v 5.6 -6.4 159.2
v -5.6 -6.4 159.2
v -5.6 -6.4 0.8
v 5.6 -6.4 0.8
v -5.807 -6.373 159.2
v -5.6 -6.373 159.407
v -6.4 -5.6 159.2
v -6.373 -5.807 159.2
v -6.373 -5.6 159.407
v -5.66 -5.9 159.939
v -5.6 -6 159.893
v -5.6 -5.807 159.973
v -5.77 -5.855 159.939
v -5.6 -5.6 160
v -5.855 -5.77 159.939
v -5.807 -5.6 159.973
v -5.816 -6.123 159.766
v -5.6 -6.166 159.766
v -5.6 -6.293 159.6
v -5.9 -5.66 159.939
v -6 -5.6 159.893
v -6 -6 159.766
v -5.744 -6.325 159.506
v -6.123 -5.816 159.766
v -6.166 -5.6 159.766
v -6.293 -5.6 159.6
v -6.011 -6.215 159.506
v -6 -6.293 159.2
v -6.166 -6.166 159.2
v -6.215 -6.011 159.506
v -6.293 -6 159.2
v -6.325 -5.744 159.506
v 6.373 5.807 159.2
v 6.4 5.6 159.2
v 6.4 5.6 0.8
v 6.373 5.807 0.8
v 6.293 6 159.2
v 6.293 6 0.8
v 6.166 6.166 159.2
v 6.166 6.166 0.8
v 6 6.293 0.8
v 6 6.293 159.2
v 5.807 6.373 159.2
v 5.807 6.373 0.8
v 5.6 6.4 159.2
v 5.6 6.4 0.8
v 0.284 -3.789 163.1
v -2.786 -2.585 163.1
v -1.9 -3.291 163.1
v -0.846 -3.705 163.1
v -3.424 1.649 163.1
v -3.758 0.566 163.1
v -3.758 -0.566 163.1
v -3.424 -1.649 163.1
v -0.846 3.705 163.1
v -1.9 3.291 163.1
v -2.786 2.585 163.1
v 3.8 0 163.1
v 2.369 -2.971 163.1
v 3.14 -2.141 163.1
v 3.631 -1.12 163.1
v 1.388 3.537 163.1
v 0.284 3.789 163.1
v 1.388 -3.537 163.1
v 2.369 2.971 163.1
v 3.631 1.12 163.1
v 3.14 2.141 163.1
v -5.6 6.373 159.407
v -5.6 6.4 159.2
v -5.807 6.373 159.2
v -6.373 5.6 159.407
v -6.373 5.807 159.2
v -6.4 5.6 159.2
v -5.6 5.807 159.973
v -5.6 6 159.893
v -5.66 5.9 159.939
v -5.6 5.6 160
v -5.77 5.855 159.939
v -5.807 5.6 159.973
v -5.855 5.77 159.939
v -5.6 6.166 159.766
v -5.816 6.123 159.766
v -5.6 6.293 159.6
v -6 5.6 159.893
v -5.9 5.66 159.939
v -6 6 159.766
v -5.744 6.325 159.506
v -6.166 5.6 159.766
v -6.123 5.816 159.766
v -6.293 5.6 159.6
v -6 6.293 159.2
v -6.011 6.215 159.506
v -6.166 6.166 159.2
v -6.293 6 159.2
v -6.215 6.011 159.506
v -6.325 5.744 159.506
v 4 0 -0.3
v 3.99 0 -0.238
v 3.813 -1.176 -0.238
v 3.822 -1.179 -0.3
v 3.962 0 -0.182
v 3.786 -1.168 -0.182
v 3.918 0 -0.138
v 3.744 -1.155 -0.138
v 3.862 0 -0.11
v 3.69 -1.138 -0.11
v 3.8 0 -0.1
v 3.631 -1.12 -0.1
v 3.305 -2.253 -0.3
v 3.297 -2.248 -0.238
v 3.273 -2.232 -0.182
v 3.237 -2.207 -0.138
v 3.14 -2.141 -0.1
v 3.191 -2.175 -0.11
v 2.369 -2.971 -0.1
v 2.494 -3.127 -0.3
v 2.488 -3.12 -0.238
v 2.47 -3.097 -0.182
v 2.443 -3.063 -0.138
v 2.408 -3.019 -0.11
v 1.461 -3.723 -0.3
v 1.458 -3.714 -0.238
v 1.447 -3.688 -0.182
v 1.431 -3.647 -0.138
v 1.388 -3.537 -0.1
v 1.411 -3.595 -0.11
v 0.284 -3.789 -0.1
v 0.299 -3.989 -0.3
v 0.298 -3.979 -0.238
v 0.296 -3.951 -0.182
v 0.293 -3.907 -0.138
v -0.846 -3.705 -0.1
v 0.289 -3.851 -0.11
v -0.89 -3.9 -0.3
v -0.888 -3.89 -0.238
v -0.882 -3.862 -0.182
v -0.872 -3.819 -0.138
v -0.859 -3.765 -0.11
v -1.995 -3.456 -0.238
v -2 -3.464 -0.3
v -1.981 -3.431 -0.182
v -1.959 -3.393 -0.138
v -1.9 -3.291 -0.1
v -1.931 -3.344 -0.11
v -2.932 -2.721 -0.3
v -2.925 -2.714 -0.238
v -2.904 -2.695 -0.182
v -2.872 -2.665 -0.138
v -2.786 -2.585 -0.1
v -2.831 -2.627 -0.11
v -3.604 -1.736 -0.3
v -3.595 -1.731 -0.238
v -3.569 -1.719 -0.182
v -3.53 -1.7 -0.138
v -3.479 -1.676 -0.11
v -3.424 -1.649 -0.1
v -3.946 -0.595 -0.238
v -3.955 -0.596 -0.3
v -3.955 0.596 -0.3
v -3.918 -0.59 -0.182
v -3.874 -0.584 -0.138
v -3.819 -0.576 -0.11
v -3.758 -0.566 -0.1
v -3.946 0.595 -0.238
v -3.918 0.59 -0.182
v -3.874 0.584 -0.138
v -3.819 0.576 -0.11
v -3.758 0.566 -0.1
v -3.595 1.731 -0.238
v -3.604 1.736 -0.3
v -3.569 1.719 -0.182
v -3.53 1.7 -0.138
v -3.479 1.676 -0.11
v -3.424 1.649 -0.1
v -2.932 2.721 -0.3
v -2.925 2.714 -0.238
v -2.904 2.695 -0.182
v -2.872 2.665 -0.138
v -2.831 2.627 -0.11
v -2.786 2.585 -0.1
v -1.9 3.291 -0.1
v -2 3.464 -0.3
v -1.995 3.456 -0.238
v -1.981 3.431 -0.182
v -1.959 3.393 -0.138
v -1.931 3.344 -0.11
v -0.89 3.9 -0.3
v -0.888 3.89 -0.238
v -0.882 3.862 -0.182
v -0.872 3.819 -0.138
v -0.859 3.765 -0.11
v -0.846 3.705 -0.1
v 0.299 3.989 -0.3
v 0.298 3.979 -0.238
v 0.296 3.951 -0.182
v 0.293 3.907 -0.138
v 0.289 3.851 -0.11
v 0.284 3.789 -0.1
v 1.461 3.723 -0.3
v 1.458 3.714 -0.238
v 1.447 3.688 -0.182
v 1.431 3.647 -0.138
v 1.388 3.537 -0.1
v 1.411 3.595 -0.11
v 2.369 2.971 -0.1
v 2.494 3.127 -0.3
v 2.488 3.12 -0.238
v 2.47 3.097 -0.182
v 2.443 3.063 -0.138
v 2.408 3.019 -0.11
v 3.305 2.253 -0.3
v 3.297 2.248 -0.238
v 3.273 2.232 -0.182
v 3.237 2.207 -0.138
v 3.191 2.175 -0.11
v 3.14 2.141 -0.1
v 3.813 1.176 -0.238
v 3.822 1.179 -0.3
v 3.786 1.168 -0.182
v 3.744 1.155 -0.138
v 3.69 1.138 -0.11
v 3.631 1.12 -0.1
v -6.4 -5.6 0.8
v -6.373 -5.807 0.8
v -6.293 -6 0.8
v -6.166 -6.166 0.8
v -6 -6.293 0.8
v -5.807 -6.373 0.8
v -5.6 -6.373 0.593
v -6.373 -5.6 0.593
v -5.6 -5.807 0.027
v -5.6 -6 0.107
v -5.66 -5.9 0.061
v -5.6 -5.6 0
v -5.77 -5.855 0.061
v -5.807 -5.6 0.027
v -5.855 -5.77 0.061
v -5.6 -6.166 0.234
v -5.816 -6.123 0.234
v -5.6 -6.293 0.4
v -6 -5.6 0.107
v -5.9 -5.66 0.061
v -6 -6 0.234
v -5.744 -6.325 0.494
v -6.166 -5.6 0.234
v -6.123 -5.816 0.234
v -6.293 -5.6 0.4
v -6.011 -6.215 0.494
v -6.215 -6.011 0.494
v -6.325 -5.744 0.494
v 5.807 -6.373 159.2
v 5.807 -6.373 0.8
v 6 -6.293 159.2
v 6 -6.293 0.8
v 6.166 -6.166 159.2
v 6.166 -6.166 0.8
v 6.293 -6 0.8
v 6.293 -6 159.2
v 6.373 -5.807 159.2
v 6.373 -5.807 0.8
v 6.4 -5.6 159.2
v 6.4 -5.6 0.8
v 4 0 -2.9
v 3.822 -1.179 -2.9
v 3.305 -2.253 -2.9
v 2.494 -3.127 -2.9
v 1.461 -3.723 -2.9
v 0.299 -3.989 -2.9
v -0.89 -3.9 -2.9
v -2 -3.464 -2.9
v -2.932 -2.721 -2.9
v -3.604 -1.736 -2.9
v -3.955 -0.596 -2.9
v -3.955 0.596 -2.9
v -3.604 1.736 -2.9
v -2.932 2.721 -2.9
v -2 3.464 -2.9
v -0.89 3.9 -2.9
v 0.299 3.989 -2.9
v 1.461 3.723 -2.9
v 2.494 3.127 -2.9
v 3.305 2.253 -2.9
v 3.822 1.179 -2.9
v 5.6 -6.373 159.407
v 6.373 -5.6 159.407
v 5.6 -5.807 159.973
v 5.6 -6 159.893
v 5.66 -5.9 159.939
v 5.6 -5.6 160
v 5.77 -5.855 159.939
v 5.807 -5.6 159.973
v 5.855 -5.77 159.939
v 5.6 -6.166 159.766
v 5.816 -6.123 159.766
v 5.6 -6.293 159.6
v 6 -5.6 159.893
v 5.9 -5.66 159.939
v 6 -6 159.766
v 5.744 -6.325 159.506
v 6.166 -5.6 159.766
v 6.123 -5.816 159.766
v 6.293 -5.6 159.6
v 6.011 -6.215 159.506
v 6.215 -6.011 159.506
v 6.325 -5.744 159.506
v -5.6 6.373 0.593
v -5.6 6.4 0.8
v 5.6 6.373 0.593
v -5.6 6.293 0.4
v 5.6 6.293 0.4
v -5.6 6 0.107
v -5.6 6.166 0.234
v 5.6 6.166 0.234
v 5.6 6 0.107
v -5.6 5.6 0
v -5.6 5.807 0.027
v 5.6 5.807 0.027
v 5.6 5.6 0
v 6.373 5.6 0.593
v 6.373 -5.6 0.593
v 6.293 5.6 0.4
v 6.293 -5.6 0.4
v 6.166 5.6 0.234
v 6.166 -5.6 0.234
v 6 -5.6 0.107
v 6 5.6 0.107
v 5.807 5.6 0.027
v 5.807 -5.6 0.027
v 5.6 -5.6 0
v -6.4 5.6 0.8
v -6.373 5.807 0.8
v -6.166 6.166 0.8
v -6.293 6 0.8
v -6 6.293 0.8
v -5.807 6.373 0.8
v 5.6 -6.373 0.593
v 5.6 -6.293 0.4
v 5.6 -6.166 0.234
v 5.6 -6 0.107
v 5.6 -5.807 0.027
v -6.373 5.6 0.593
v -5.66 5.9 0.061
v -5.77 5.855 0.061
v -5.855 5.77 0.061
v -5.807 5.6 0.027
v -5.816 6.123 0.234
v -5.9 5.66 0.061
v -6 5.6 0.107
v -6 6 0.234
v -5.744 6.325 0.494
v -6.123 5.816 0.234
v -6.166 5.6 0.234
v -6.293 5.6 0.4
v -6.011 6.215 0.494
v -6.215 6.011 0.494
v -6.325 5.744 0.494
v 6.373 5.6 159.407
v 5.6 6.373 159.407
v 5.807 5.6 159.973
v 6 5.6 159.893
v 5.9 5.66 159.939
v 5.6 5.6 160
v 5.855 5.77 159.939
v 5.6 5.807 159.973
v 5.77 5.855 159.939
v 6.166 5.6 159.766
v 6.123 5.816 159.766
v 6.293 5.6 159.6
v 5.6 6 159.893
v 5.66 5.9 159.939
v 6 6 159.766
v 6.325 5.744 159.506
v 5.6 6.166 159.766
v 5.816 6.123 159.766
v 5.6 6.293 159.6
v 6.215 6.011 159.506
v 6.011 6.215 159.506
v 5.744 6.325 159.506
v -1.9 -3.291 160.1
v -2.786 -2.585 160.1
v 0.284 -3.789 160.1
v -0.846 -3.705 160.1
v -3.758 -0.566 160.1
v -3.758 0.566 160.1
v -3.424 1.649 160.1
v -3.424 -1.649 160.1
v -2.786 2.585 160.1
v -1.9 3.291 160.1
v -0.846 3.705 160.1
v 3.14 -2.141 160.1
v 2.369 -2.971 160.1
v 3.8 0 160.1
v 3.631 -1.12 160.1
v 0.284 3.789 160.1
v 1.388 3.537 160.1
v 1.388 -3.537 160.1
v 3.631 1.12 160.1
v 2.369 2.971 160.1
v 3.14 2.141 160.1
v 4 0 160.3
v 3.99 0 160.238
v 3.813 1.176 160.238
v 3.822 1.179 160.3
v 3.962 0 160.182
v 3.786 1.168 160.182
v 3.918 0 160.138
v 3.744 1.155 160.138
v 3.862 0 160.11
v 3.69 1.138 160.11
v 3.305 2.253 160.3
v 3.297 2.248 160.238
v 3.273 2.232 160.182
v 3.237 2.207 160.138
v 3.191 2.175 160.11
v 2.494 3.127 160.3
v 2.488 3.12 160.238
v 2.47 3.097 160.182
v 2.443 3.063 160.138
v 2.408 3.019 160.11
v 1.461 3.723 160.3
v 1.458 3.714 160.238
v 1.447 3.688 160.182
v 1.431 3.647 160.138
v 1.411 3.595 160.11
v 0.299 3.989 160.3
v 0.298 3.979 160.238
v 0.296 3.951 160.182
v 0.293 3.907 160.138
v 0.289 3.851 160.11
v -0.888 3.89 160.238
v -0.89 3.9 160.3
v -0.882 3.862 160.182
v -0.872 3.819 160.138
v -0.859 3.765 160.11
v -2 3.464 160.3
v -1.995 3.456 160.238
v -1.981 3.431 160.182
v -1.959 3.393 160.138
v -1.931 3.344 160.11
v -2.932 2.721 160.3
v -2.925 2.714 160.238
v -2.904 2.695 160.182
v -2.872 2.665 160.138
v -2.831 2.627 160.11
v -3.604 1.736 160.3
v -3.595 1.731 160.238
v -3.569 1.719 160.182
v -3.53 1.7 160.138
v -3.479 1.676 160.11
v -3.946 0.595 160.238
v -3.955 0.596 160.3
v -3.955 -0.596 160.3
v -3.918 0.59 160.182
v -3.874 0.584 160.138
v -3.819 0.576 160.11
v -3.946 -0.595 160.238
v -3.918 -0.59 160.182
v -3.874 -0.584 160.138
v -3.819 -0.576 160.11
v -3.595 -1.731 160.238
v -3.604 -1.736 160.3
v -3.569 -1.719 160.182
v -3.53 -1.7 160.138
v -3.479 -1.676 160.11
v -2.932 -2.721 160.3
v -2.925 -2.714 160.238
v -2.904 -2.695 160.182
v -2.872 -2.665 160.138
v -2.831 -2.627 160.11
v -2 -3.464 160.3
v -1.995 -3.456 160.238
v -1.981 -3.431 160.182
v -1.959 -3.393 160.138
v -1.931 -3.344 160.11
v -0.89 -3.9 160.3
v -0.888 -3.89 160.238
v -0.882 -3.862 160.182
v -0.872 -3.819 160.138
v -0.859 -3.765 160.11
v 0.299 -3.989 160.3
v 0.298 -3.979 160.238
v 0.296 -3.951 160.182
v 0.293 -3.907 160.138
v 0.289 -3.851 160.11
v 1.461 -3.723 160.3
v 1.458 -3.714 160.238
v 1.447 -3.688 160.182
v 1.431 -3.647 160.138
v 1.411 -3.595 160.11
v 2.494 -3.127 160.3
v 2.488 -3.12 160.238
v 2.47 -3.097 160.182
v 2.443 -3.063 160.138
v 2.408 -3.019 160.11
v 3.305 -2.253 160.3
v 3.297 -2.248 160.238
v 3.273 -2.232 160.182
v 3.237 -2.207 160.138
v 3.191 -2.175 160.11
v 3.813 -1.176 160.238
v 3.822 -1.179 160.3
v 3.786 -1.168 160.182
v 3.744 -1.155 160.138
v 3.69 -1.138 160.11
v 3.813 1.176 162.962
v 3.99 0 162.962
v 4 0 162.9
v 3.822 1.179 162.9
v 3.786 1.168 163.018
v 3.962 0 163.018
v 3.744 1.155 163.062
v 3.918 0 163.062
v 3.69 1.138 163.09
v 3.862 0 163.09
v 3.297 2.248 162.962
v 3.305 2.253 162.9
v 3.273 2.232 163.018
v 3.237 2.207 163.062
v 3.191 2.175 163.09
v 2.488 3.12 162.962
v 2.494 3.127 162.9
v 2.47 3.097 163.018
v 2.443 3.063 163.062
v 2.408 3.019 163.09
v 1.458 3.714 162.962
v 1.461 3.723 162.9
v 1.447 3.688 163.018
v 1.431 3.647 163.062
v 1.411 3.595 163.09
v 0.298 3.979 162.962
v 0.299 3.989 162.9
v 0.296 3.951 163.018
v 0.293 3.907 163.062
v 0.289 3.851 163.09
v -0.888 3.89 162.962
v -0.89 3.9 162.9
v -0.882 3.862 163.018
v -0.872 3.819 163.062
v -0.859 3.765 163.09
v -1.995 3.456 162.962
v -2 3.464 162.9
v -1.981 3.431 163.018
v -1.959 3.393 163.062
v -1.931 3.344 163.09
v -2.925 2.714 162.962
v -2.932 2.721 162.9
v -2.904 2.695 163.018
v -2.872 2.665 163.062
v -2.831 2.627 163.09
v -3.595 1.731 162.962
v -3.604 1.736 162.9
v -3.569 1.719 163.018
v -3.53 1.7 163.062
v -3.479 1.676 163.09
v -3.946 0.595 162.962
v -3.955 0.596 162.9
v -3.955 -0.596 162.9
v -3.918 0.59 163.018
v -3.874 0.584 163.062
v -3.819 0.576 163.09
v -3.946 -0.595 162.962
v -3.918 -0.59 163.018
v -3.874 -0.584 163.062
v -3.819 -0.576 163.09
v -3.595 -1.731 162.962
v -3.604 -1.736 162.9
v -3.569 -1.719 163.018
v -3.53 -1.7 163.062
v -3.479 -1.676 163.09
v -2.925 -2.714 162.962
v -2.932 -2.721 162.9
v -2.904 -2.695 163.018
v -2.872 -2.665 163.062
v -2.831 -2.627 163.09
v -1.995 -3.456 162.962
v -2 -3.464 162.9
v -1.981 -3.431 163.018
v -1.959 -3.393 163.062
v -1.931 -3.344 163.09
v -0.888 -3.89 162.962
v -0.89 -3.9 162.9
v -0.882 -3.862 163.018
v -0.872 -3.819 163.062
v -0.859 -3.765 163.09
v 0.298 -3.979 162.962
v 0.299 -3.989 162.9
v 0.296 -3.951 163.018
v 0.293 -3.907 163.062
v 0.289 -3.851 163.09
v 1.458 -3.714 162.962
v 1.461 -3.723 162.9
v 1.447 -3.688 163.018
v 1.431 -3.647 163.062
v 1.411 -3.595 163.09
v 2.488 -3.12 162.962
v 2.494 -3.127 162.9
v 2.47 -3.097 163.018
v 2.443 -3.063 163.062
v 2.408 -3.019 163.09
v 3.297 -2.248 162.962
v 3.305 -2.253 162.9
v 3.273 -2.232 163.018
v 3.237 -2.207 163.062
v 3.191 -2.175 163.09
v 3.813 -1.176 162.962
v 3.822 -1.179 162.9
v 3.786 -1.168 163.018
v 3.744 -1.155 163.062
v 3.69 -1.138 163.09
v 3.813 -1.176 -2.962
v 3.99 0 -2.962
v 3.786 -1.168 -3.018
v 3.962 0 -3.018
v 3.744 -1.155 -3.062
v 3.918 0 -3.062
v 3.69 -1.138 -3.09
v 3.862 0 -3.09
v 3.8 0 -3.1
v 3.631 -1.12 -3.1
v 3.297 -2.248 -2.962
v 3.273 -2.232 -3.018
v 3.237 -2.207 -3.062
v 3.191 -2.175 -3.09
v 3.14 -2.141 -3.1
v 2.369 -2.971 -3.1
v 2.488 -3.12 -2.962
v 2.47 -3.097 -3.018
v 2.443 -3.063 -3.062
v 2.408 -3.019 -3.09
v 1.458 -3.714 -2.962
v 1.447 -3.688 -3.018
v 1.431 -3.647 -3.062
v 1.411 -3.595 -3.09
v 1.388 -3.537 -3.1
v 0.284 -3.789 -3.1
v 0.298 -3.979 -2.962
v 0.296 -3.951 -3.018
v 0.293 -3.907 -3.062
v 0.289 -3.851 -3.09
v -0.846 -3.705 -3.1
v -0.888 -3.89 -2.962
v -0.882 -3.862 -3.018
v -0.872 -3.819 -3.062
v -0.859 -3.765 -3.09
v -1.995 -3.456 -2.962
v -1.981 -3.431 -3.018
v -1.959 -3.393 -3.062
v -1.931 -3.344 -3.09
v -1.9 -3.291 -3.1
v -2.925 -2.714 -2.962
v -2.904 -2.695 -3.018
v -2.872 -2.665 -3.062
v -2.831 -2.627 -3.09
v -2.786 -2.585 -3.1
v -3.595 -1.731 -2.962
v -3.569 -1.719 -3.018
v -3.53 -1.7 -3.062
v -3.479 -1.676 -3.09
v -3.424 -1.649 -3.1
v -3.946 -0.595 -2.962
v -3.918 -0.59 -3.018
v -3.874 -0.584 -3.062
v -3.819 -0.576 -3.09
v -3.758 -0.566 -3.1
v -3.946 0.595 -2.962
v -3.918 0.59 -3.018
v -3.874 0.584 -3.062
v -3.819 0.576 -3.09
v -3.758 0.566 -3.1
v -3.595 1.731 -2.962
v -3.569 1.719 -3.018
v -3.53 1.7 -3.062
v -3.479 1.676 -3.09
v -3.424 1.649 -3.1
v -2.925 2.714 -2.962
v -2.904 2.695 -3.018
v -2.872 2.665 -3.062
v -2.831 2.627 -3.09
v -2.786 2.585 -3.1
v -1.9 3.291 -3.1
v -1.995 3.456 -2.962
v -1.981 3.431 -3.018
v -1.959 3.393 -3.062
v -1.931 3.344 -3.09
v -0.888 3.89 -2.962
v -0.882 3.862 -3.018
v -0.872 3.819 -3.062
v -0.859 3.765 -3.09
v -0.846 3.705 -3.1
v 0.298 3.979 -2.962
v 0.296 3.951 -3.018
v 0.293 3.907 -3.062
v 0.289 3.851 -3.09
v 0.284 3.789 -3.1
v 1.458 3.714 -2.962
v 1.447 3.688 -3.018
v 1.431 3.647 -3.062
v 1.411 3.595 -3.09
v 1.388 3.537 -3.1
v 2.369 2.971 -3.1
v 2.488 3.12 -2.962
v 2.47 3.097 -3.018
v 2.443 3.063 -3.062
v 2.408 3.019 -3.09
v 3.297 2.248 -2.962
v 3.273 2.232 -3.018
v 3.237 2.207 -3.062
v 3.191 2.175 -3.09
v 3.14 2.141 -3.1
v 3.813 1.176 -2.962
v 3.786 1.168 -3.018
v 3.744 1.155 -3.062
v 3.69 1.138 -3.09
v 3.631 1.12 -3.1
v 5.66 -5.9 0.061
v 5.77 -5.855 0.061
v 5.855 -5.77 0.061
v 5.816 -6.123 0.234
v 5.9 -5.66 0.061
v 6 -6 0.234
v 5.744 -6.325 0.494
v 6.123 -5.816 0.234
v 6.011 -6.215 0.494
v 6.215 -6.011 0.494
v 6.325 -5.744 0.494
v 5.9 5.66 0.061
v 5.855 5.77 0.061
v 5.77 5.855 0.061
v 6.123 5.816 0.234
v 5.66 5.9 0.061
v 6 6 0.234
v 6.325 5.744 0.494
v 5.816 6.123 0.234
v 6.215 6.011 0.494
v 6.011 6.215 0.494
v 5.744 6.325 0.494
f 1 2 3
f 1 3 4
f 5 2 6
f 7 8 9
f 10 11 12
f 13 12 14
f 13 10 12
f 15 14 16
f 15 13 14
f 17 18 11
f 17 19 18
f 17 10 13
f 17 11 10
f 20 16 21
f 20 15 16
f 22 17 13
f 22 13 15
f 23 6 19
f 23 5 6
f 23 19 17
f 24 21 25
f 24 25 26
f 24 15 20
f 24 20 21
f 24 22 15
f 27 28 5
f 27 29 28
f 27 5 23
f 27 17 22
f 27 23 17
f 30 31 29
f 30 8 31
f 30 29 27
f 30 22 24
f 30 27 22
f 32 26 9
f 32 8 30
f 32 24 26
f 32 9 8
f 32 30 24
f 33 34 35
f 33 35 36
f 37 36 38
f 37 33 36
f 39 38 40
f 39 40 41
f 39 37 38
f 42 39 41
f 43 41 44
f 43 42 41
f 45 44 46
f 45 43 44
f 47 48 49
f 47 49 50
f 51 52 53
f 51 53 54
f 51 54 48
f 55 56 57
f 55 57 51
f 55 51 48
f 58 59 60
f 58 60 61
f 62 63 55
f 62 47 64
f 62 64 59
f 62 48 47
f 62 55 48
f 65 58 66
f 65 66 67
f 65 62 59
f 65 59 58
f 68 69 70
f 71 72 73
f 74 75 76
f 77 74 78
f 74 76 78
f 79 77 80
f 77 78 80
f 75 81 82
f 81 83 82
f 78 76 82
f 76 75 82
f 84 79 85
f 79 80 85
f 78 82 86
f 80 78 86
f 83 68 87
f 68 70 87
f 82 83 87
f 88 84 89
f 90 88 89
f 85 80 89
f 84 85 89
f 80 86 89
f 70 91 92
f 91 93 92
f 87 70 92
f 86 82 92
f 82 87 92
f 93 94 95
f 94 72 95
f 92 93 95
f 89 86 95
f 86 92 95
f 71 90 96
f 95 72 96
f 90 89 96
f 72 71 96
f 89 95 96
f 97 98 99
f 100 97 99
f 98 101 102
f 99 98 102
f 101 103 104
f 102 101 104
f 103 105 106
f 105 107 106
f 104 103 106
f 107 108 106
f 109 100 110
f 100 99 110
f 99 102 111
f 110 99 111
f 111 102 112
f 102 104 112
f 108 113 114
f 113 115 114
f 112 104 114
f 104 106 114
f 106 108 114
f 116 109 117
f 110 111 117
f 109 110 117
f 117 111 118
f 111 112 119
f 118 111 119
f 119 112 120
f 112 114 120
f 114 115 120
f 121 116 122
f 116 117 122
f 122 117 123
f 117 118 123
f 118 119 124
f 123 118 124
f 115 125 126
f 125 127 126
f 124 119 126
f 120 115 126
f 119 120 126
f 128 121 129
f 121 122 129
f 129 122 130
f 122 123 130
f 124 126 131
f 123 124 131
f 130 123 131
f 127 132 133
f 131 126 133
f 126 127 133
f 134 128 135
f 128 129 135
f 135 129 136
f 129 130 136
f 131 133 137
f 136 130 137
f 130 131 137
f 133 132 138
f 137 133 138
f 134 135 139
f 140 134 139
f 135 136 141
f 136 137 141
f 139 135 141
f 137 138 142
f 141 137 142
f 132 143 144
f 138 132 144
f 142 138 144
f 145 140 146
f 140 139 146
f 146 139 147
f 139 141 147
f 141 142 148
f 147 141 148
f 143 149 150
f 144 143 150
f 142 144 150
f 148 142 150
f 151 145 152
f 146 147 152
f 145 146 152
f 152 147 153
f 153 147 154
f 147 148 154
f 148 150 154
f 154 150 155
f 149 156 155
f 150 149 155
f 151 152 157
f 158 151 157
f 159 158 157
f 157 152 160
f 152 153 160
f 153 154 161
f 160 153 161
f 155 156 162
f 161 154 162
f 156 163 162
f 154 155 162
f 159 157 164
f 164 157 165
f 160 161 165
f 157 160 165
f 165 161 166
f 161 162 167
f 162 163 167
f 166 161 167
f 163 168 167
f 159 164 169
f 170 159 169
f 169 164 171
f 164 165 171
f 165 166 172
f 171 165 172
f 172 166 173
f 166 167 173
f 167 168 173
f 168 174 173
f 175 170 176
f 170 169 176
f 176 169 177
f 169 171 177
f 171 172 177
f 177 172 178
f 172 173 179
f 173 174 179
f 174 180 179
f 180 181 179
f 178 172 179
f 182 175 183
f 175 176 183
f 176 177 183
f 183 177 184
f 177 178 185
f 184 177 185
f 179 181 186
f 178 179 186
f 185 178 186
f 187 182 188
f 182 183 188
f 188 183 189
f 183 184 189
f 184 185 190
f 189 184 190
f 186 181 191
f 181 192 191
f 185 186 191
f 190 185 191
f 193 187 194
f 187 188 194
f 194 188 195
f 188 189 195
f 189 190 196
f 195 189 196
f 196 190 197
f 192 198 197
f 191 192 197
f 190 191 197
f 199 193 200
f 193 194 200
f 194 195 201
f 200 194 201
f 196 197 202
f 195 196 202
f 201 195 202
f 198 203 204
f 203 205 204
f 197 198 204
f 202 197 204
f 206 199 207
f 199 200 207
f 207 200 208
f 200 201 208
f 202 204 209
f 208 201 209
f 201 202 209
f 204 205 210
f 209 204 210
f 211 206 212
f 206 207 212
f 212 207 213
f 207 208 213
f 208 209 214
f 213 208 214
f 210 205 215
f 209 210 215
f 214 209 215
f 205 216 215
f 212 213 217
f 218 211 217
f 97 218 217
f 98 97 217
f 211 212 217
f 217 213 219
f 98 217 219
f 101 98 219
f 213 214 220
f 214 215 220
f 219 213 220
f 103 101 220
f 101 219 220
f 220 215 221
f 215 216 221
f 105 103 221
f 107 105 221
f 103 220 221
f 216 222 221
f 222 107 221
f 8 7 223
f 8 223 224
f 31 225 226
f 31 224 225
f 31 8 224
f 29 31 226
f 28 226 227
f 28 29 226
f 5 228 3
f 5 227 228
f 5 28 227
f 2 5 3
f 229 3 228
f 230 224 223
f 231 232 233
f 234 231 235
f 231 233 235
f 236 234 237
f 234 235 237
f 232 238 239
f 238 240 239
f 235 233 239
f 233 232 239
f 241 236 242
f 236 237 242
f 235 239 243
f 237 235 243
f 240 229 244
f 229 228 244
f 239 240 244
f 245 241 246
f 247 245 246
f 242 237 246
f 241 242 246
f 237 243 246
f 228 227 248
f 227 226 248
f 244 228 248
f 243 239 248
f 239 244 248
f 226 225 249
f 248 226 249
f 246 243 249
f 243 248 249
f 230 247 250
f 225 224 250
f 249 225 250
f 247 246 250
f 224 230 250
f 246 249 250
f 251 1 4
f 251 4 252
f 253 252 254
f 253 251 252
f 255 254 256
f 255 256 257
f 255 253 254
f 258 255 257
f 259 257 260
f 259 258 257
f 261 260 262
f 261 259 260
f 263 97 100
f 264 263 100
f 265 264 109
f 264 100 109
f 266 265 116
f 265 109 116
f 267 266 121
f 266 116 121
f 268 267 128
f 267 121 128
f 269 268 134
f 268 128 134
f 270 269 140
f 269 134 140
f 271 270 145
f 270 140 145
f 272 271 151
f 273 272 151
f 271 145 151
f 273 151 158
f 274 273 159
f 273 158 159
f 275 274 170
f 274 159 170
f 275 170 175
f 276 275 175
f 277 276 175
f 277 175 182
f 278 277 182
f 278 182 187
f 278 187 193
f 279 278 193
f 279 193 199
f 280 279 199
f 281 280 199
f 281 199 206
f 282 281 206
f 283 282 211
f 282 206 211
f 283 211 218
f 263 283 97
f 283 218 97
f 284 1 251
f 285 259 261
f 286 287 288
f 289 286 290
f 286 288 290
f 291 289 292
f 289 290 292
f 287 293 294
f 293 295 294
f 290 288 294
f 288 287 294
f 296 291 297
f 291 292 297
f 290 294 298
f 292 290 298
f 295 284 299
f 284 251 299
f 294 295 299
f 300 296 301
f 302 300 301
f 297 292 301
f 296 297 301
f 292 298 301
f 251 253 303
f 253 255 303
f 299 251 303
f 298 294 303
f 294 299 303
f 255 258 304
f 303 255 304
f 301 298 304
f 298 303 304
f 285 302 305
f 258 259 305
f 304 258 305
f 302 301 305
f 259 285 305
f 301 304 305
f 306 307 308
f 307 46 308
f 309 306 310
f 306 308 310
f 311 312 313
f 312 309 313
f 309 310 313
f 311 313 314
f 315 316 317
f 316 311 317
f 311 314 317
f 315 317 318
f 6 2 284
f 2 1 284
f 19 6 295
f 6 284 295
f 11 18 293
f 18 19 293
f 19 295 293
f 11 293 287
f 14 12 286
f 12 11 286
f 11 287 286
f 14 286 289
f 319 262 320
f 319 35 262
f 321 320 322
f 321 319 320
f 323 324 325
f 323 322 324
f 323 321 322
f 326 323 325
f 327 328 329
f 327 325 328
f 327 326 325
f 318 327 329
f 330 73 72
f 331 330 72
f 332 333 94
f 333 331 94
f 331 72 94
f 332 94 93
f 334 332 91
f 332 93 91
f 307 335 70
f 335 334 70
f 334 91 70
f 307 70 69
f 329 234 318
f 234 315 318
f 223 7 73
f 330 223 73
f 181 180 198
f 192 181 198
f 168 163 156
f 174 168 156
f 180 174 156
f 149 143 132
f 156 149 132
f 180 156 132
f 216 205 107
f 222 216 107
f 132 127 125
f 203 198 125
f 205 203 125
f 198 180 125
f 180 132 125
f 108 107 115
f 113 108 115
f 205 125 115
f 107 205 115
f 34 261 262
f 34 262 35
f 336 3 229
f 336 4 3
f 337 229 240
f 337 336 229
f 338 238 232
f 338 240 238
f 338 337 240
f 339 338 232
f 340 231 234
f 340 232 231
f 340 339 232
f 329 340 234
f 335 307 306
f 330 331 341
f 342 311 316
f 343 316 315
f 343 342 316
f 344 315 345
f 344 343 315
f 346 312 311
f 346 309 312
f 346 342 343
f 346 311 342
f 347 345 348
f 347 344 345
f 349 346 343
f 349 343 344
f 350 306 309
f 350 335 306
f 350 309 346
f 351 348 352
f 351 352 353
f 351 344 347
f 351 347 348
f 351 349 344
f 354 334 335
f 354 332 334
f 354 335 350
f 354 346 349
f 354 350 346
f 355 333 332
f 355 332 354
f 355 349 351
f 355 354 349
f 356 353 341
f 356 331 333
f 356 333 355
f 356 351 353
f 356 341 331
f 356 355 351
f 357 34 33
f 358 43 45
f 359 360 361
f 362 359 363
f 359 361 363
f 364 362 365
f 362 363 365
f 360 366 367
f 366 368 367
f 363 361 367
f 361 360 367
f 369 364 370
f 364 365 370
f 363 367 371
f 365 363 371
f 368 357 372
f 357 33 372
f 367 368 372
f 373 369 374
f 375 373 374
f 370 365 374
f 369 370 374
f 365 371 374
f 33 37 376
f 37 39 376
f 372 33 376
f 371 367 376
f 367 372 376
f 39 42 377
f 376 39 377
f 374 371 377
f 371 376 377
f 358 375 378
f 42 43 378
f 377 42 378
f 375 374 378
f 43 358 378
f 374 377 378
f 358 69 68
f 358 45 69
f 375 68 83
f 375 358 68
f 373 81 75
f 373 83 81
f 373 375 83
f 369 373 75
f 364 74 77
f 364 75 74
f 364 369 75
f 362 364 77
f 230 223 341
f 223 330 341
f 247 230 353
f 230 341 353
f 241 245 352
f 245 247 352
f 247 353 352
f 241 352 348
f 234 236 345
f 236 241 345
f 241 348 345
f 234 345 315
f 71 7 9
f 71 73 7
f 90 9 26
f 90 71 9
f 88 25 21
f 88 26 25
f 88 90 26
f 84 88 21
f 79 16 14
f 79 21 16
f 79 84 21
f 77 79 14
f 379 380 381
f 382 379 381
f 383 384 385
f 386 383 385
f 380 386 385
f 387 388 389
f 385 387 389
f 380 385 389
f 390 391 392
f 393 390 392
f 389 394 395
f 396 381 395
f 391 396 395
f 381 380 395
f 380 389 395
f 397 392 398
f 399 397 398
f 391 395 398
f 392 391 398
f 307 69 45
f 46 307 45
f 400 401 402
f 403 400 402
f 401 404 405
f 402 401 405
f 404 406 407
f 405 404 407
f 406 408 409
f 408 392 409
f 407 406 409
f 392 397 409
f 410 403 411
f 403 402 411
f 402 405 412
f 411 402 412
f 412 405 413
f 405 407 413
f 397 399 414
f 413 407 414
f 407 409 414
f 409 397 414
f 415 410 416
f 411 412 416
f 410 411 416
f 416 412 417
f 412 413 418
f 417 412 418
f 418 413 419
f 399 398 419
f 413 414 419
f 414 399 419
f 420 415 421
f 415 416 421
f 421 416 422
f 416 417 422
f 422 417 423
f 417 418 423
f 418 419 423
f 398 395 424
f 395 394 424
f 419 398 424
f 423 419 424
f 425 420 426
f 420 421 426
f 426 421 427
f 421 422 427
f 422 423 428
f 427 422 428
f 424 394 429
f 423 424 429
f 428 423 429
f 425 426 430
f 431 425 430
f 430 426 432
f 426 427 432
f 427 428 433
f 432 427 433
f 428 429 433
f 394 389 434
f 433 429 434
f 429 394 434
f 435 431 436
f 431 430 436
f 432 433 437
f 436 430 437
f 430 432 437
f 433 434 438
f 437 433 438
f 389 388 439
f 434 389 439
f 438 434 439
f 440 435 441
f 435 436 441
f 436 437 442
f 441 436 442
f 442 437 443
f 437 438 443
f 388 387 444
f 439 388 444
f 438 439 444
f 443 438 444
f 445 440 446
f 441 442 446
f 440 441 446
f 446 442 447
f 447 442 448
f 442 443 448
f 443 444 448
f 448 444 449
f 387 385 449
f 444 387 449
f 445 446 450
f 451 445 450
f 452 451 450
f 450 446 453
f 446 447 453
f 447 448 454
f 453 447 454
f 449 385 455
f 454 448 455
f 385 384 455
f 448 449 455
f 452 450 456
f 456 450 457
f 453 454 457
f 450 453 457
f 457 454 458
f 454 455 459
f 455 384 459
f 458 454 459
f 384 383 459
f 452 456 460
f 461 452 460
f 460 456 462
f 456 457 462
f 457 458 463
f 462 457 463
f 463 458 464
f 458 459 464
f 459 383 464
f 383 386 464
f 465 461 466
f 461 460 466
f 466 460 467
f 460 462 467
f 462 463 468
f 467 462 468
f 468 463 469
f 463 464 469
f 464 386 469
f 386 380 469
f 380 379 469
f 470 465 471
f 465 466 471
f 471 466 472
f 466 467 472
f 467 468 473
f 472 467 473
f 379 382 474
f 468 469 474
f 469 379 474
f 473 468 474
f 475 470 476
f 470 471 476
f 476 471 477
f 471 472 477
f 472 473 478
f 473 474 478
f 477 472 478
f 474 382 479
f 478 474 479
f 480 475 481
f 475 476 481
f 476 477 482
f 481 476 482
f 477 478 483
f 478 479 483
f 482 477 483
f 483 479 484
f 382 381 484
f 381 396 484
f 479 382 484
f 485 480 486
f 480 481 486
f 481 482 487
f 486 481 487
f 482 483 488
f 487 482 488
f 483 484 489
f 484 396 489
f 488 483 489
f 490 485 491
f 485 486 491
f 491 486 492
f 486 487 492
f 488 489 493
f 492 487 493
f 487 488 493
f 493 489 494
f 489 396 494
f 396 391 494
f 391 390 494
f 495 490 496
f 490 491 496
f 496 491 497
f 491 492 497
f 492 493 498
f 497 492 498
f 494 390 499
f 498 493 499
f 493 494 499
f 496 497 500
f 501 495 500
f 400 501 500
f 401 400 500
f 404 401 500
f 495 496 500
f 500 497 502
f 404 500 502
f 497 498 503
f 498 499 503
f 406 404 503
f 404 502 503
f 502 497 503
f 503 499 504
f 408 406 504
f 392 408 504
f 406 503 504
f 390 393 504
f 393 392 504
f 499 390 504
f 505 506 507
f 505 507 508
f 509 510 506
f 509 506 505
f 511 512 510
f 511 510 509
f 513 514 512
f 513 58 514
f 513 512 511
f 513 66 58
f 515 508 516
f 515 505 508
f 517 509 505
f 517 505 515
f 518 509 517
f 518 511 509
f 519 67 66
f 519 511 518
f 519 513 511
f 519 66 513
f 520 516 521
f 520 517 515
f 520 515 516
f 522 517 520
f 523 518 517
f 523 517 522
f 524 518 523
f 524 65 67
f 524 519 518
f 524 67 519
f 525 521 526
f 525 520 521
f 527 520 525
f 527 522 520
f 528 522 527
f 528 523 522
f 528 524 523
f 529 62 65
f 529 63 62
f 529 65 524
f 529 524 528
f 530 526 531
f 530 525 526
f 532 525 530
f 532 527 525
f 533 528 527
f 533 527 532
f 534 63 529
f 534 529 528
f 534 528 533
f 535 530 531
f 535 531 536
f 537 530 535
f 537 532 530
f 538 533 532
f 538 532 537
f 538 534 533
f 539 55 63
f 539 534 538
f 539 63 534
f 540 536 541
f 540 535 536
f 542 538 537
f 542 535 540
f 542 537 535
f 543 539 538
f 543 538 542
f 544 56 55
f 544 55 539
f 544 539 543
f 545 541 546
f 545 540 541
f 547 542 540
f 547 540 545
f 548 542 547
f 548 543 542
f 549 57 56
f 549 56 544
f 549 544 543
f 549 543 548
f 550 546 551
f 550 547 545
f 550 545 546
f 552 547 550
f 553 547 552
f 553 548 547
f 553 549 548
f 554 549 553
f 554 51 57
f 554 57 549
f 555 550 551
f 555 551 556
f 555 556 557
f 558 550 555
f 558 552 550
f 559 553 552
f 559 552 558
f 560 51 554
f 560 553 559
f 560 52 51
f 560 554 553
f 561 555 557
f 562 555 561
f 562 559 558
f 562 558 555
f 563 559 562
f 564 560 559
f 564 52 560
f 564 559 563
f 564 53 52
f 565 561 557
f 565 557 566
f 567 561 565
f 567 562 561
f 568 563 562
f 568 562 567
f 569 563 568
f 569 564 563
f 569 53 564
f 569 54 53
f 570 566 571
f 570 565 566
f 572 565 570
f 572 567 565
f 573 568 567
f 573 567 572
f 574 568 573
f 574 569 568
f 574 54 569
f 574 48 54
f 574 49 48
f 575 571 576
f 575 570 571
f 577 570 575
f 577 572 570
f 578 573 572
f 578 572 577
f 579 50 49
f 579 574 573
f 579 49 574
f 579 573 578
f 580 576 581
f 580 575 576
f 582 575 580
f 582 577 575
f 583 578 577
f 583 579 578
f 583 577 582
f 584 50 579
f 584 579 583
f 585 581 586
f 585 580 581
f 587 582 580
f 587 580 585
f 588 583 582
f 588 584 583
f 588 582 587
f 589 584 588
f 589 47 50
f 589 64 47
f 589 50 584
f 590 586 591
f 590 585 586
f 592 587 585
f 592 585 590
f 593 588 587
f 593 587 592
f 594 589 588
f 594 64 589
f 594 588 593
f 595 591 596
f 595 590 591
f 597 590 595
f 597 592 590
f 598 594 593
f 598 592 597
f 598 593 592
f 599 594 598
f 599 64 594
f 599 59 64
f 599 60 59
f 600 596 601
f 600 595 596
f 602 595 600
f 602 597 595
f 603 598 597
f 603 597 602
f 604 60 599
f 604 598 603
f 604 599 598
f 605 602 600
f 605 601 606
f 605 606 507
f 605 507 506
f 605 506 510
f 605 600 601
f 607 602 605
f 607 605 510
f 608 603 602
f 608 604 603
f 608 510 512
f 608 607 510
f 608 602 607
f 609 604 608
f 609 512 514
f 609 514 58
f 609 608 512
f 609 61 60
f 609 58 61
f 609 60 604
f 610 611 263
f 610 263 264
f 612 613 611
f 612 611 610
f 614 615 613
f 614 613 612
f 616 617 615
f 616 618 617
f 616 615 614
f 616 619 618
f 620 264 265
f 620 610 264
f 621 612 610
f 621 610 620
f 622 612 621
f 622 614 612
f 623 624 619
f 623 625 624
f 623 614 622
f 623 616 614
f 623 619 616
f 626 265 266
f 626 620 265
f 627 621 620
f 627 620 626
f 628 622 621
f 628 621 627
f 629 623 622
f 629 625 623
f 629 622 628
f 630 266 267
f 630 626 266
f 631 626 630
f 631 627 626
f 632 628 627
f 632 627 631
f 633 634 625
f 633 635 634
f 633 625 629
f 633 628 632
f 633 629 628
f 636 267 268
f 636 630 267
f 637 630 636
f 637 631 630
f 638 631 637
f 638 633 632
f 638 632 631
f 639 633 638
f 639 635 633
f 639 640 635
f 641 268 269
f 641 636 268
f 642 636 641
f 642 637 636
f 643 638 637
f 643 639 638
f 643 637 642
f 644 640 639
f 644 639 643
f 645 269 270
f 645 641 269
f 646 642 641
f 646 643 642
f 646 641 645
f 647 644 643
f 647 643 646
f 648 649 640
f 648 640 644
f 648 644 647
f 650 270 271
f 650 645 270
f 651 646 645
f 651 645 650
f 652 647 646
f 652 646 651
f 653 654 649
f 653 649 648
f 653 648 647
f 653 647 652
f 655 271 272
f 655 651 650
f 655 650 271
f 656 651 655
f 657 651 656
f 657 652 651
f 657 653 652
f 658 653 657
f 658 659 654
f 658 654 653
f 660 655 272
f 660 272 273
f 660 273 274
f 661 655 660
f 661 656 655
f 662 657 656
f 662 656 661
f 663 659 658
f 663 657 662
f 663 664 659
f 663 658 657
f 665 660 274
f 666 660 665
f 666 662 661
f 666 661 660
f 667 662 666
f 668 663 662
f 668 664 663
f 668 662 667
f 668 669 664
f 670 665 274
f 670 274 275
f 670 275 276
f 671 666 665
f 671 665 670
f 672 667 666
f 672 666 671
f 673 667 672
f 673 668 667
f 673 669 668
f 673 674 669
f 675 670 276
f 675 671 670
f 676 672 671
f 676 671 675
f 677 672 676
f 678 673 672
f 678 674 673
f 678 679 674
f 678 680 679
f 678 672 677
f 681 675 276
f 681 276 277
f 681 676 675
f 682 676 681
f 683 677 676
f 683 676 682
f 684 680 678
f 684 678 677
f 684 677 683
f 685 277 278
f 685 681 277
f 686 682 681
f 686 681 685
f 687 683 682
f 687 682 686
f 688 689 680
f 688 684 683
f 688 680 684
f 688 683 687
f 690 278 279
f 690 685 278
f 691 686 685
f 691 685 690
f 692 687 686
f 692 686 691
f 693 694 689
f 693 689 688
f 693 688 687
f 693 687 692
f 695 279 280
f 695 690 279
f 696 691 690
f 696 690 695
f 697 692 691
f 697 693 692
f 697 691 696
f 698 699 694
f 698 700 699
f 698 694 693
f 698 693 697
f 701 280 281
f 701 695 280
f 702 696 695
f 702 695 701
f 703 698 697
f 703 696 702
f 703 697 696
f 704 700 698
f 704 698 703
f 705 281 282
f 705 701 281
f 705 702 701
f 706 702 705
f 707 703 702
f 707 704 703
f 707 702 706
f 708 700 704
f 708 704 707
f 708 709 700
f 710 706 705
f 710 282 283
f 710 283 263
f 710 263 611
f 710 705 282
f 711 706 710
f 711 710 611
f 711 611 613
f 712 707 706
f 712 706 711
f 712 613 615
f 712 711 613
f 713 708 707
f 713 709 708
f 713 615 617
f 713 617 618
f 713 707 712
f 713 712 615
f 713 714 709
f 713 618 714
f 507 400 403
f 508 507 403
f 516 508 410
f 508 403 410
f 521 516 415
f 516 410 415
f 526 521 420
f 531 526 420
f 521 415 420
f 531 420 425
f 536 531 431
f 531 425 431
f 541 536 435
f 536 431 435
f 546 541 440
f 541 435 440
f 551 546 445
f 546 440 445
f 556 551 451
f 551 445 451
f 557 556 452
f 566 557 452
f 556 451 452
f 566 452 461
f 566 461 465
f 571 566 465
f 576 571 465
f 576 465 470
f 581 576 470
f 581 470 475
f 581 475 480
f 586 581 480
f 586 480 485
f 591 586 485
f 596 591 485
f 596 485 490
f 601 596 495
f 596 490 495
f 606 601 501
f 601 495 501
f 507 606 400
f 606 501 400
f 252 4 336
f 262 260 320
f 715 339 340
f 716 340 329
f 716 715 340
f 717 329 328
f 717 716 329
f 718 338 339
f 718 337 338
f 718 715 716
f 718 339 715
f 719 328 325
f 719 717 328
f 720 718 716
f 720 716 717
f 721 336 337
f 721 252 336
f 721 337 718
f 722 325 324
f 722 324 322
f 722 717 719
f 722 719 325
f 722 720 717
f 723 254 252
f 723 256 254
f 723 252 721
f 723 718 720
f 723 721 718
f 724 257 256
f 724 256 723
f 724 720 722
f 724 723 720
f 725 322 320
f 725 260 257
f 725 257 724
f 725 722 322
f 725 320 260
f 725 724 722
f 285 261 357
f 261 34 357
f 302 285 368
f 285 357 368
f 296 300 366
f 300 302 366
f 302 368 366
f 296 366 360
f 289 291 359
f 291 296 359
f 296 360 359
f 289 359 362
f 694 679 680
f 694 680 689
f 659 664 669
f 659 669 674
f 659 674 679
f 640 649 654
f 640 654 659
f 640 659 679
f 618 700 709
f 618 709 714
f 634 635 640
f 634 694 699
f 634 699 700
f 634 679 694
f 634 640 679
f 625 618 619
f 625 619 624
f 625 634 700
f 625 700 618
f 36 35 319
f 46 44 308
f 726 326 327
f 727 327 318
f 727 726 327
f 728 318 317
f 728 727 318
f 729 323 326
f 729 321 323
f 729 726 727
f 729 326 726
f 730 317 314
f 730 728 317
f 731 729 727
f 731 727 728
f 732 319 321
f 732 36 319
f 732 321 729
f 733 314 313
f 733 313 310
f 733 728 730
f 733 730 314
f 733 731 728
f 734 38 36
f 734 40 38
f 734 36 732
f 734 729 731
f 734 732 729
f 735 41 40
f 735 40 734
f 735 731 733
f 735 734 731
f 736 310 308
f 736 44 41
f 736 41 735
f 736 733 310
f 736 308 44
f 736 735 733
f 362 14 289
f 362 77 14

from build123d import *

# Parameters (mm, degrees)
F0_W     = 12.8
F0_H     = 12.8
F1_DEPTH = 160
F2_R     = 0.8
F4_START = 0.1
F3_R     = 4
F4_DEPTH = 3
F5_R     = 0.2
F7_START = 0.1
F6_R     = 4
F7_DEPTH = 3
F8_R     = 0.2


with BuildPart() as f1:
    # F0 (on Top) → F1 (new body)
    with BuildSketch(Plane.XY):
        Rectangle(F0_W, F0_H)
    extrude(amount=F1_DEPTH)

    # F2
    f2_edges = [f1.edges().sort_by_distance(p)[0] for p in [
        (6.4, -6.4, 80),
        (-6.4, -6.4, 80),
        (6.4, 6.4, 80),
        (-6.4, 6.4, 80),
        (0, -6.4, 0),
        (6.4, 0, 0),
        (0, 6.4, 0),
        (-6.4, 0, 0),
        (0, -6.4, 160),
        (6.4, 0, 160),
        (0, 6.4, 160),
        (-6.4, 0, 160),
    ]]
    fillet(f2_edges, radius=F2_R)


with BuildPart() as f4:
    # F3 (on face) → F4 (new body)
    with BuildSketch(Plane(origin=(0, 0, 0), x_dir=(1, 0, 0), z_dir=(0, 0, -1)).offset(F4_START)):
        Circle(F3_R)
    extrude(amount=F4_DEPTH)

    # F5
    f5_edges = [f4.edges().sort_by_distance(p)[0] for p in [
        (-4, 0, -3.1),
        (-4, 0, -0.1),
    ]]
    fillet(f5_edges, radius=F5_R)


with BuildPart() as f7:
    # F6 (on face) → F7 (new body)
    with BuildSketch(Plane.XY.offset(160).offset(F7_START)):
        Circle(F6_R)
    extrude(amount=F7_DEPTH)

    # F8
    f8_edges = [f7.edges().sort_by_distance(p)[0] for p in [
        (-4, 0, 163.1),
        (-4, 0, 160.1),
    ]]
    fillet(f8_edges, radius=F8_R)


solid = Compound([f1.part, f4.part, f7.part])
